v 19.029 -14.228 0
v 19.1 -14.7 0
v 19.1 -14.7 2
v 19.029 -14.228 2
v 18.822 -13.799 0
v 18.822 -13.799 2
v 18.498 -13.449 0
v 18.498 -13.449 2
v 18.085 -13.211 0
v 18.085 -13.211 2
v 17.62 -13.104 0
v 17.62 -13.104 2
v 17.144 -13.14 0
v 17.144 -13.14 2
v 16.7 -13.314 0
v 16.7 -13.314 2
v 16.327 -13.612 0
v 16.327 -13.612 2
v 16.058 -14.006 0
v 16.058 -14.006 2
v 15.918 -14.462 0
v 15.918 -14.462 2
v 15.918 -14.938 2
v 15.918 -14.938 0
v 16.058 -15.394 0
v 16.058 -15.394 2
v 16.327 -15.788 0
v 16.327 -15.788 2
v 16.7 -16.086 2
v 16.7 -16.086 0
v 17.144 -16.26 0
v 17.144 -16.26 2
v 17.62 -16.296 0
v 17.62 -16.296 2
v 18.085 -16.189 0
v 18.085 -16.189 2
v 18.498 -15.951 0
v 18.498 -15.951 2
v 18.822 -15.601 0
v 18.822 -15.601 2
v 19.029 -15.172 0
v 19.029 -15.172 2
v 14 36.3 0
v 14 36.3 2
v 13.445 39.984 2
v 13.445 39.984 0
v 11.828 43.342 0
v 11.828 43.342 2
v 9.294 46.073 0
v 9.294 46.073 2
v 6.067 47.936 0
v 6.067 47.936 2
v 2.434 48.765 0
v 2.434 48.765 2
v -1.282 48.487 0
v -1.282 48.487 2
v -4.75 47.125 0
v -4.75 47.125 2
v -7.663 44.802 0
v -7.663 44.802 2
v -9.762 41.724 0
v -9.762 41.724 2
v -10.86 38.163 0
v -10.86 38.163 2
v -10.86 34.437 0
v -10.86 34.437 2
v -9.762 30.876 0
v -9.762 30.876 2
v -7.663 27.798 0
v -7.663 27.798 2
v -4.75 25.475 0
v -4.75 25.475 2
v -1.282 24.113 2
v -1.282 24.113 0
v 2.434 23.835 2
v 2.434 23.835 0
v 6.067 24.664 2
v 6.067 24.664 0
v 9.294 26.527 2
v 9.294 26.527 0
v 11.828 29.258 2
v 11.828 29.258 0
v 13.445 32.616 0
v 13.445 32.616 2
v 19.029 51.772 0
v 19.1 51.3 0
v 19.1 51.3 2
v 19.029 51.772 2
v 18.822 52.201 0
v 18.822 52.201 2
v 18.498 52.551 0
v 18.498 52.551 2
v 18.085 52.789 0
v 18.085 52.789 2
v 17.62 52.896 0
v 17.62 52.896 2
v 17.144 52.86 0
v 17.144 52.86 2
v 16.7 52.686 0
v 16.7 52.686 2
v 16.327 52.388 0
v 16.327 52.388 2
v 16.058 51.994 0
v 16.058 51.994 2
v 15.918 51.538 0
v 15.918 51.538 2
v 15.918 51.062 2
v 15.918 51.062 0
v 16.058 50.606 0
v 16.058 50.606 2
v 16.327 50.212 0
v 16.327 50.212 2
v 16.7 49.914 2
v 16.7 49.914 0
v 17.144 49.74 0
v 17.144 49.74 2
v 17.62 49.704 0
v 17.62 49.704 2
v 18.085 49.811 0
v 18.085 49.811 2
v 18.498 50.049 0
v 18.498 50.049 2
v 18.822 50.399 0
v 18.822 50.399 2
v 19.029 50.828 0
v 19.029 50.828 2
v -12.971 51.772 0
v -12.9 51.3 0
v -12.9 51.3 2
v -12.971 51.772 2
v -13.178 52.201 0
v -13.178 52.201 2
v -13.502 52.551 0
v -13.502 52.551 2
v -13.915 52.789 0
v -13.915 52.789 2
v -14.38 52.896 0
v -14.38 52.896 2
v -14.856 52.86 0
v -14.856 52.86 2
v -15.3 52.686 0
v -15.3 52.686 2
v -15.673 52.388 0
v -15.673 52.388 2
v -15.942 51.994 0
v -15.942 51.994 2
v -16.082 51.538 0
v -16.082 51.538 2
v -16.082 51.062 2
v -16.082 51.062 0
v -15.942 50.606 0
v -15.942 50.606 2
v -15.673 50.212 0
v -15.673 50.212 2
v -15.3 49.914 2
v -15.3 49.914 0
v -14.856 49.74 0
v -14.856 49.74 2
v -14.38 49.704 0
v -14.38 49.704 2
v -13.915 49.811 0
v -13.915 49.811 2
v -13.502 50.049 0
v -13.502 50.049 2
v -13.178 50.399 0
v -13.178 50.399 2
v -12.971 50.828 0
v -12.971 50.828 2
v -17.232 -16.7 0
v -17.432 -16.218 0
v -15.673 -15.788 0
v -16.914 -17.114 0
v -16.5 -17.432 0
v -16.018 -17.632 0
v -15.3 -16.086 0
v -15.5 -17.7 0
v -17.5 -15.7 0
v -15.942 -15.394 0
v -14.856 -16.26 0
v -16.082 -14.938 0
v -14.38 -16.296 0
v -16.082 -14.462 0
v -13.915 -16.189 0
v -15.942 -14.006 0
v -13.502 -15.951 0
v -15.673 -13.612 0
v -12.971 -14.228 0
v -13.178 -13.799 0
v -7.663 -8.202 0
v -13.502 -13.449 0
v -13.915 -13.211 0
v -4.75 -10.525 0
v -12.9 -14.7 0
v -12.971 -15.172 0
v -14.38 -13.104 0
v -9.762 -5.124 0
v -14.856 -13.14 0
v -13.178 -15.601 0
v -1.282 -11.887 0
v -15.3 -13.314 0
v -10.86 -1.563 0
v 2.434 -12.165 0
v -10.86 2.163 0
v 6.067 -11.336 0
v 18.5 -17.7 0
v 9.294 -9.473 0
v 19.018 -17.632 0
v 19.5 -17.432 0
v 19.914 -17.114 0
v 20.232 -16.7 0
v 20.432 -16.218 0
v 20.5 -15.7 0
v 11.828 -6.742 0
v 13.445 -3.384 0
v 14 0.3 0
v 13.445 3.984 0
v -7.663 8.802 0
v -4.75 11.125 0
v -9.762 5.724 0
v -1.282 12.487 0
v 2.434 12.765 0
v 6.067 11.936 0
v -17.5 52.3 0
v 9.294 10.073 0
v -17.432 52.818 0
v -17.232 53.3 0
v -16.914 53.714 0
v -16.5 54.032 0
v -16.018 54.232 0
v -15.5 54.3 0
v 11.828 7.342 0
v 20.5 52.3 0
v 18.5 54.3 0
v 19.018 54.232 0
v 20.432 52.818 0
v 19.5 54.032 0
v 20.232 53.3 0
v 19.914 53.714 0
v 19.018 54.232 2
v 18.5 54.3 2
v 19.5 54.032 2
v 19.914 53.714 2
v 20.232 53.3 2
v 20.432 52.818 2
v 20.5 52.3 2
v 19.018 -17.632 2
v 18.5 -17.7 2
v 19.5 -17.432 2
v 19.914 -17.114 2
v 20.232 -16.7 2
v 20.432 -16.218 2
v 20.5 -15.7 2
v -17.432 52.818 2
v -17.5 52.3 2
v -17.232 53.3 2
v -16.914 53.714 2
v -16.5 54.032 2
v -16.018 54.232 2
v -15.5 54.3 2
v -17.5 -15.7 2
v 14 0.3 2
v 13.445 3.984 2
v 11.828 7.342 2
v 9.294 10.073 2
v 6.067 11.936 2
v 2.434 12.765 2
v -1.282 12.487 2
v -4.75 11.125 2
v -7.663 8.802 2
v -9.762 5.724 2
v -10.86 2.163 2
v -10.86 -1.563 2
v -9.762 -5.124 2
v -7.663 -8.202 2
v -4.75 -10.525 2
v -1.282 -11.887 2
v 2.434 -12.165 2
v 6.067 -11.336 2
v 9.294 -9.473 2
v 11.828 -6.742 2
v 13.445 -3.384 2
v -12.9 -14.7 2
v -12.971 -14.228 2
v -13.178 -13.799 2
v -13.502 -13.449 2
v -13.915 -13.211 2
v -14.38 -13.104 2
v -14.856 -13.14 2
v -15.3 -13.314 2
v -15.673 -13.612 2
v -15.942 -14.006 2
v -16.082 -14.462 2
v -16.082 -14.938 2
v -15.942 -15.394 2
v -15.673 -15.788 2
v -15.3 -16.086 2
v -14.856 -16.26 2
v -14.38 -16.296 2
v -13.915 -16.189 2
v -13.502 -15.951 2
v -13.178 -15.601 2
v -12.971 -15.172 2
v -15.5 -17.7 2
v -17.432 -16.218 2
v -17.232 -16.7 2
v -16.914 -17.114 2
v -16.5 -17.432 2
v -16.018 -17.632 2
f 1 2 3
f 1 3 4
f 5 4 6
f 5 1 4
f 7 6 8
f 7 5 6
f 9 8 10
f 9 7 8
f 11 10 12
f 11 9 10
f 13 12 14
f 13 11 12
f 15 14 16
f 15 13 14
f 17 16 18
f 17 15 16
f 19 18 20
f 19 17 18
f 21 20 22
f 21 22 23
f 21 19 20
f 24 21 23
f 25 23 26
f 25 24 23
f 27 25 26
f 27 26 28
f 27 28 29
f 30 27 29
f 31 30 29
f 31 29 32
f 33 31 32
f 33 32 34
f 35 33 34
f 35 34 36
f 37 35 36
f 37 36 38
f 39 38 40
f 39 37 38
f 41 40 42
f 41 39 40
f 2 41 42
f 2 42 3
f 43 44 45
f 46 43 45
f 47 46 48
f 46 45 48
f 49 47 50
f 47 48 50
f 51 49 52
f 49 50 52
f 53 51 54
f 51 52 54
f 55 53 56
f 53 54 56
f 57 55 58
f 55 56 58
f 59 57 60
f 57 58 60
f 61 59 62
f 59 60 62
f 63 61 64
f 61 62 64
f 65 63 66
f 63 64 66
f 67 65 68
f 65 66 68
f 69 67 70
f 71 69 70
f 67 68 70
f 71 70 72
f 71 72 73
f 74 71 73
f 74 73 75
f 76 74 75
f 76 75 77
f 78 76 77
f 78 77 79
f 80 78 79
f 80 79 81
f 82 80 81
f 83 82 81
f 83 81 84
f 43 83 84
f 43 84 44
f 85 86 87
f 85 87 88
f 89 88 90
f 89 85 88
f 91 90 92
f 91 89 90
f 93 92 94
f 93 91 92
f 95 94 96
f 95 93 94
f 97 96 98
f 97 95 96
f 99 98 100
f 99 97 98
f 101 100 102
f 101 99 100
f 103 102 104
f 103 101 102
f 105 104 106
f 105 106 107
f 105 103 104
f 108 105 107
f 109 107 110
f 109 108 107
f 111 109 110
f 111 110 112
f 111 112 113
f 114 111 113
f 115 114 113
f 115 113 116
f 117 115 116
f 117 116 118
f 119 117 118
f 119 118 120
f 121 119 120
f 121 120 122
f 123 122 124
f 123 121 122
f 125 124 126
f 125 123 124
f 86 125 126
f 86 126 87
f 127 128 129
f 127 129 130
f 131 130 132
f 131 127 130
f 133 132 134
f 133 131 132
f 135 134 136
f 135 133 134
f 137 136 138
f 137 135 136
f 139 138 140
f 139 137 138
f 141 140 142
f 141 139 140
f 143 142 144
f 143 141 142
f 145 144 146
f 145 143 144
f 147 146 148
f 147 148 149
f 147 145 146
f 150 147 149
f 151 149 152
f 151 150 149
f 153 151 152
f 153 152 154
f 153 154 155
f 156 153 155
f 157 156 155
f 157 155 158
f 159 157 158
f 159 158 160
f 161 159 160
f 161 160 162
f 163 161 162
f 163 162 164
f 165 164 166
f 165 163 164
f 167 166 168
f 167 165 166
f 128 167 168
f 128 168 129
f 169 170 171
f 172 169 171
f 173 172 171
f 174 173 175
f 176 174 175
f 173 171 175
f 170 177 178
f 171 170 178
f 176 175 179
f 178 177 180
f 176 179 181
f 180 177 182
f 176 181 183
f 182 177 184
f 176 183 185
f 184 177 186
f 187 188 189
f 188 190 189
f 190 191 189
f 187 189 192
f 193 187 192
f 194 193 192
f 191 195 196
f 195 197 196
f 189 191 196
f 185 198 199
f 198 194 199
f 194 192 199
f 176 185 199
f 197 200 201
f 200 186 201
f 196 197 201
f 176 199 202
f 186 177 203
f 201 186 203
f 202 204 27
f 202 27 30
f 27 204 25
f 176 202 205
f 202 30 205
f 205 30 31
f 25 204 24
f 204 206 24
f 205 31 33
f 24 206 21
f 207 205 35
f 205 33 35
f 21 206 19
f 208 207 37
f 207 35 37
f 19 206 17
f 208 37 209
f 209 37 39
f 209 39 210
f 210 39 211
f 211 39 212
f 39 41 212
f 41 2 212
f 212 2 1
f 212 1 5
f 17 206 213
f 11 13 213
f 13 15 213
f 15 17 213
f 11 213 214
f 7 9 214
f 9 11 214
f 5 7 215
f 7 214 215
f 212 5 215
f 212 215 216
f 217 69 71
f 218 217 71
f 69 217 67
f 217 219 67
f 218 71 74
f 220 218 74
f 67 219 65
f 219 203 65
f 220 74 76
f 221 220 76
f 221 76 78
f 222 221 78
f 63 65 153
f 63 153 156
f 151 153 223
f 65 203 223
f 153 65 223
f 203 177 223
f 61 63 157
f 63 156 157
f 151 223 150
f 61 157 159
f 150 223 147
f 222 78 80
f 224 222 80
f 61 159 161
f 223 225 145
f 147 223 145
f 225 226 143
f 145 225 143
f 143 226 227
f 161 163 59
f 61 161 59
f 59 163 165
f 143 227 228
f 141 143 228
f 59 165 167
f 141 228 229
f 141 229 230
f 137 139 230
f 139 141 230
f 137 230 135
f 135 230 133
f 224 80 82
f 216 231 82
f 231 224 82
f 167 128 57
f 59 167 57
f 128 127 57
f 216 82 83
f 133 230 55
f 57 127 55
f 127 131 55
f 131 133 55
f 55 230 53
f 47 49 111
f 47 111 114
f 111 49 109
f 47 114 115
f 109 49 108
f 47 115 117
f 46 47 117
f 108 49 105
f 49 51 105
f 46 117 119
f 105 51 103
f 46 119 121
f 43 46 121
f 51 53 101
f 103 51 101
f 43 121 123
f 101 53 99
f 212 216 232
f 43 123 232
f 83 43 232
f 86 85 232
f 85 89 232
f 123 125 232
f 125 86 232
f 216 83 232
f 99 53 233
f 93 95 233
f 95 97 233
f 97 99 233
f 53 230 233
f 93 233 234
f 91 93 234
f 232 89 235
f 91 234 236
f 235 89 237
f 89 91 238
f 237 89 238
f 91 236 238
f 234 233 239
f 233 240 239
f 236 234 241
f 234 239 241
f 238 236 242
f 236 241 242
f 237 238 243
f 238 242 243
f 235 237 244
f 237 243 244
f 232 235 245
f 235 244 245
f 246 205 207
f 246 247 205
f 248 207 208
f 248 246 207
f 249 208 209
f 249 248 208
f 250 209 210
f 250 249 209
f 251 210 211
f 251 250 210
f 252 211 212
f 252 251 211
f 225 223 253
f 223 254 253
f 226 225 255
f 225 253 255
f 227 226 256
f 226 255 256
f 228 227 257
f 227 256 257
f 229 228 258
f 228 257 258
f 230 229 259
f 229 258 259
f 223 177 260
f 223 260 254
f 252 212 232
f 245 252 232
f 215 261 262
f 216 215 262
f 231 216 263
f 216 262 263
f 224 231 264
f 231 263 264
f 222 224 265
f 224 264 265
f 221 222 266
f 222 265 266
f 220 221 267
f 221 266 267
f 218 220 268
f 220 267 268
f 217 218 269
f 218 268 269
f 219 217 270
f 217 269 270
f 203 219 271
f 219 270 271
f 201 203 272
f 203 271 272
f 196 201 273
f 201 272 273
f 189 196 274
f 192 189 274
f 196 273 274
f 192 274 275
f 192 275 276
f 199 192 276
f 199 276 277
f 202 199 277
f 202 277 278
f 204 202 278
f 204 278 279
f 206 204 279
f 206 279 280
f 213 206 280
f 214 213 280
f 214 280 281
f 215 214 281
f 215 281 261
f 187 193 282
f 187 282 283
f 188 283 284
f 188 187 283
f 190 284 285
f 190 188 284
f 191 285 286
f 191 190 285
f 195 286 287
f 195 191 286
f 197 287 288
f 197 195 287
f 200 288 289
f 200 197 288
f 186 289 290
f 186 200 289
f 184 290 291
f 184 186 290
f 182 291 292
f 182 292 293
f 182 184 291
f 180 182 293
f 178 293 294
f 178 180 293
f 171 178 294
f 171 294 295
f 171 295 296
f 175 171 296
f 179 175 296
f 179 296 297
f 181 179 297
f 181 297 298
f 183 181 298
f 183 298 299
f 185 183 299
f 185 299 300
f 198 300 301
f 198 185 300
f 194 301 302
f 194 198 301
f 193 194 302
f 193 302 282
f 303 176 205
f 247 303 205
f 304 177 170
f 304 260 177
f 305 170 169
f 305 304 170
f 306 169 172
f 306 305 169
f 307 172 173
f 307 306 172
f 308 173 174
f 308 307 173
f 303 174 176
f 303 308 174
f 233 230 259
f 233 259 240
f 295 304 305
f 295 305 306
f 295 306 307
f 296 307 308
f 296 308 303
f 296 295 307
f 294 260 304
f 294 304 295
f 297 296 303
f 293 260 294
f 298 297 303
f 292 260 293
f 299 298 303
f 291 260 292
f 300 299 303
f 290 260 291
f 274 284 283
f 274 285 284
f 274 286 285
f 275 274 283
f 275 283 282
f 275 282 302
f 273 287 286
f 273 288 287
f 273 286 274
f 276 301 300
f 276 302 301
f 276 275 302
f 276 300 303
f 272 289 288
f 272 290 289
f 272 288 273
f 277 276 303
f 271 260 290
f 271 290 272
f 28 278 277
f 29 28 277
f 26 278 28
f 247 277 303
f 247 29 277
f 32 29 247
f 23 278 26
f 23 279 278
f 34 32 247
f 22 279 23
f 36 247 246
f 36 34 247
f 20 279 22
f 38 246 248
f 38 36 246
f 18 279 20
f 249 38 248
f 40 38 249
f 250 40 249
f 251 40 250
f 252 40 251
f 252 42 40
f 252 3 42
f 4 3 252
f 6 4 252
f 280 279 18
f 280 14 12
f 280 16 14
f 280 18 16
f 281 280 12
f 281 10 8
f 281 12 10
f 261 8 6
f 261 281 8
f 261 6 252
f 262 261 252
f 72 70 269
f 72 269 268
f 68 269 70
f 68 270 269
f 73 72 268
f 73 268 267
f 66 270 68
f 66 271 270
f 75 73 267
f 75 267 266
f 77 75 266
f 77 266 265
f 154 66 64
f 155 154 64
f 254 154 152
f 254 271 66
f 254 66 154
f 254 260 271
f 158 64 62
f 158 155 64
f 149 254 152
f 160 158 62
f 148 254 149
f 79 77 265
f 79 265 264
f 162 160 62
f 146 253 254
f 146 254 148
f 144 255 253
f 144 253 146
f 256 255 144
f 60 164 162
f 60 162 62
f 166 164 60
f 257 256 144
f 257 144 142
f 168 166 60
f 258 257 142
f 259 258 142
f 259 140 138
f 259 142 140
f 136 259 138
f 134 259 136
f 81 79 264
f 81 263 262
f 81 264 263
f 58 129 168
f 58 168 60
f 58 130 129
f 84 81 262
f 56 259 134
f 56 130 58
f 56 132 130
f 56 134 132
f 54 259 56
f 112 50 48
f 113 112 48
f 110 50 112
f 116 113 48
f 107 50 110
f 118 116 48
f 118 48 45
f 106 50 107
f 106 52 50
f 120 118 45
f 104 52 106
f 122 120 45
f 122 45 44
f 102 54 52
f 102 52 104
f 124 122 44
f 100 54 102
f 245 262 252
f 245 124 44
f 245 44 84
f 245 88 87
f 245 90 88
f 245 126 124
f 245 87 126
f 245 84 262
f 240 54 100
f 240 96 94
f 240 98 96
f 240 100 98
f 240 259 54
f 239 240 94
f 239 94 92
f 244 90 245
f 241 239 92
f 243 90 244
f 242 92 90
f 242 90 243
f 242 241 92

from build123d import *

# Parameters (mm, degrees)
SKETCH1_W           = 38
SKETCH1_H           = 72
SKETCH1_R           = 1.6
BOSS_EXTRUDE1_DEPTH = 2
SKETCH2_R           = 12.5
CUT_EXTRUDE1_DEPTH  = 59.075295953
FILLET2_R           = 2


with BuildPart() as part:
    # Sketch1 → Boss-Extrude1 (new body)
    with BuildSketch(Plane.XY):
        with Locations((1.5, 18.3)):
            Rectangle(SKETCH1_W, SKETCH1_H)
        with Locations((17.5, -14.7)):
            Circle(SKETCH1_R, mode=Mode.SUBTRACT)
        with Locations((-14.5, -14.7)):
            Circle(SKETCH1_R, mode=Mode.SUBTRACT)
        with Locations((17.5, 51.3)):
            Circle(SKETCH1_R, mode=Mode.SUBTRACT)
        with Locations((-14.5, 51.3)):
            Circle(SKETCH1_R, mode=Mode.SUBTRACT)
    extrude(amount=BOSS_EXTRUDE1_DEPTH)

    # Sketch2 → Cut-Extrude1 (cut, through all)
    with BuildSketch(Plane.XY.offset(2)):
        with Locations((1.5, 0.3)):
            Circle(SKETCH2_R)
        with Locations((1.5, 36.3)):
            Circle(SKETCH2_R)
    extrude(amount=-CUT_EXTRUDE1_DEPTH, mode=Mode.SUBTRACT)

    # Fillet2
    fillet2_edges = [part.edges().sort_by_distance(p)[0] for p in [
        (20.5, -17.7, 1),
        (-17.5, -17.7, 1),
        (-17.5, 54.3, 1),
        (20.5, 54.3, 1),
    ]]
    fillet(fillet2_edges, radius=FILLET2_R)


solid = part.part
